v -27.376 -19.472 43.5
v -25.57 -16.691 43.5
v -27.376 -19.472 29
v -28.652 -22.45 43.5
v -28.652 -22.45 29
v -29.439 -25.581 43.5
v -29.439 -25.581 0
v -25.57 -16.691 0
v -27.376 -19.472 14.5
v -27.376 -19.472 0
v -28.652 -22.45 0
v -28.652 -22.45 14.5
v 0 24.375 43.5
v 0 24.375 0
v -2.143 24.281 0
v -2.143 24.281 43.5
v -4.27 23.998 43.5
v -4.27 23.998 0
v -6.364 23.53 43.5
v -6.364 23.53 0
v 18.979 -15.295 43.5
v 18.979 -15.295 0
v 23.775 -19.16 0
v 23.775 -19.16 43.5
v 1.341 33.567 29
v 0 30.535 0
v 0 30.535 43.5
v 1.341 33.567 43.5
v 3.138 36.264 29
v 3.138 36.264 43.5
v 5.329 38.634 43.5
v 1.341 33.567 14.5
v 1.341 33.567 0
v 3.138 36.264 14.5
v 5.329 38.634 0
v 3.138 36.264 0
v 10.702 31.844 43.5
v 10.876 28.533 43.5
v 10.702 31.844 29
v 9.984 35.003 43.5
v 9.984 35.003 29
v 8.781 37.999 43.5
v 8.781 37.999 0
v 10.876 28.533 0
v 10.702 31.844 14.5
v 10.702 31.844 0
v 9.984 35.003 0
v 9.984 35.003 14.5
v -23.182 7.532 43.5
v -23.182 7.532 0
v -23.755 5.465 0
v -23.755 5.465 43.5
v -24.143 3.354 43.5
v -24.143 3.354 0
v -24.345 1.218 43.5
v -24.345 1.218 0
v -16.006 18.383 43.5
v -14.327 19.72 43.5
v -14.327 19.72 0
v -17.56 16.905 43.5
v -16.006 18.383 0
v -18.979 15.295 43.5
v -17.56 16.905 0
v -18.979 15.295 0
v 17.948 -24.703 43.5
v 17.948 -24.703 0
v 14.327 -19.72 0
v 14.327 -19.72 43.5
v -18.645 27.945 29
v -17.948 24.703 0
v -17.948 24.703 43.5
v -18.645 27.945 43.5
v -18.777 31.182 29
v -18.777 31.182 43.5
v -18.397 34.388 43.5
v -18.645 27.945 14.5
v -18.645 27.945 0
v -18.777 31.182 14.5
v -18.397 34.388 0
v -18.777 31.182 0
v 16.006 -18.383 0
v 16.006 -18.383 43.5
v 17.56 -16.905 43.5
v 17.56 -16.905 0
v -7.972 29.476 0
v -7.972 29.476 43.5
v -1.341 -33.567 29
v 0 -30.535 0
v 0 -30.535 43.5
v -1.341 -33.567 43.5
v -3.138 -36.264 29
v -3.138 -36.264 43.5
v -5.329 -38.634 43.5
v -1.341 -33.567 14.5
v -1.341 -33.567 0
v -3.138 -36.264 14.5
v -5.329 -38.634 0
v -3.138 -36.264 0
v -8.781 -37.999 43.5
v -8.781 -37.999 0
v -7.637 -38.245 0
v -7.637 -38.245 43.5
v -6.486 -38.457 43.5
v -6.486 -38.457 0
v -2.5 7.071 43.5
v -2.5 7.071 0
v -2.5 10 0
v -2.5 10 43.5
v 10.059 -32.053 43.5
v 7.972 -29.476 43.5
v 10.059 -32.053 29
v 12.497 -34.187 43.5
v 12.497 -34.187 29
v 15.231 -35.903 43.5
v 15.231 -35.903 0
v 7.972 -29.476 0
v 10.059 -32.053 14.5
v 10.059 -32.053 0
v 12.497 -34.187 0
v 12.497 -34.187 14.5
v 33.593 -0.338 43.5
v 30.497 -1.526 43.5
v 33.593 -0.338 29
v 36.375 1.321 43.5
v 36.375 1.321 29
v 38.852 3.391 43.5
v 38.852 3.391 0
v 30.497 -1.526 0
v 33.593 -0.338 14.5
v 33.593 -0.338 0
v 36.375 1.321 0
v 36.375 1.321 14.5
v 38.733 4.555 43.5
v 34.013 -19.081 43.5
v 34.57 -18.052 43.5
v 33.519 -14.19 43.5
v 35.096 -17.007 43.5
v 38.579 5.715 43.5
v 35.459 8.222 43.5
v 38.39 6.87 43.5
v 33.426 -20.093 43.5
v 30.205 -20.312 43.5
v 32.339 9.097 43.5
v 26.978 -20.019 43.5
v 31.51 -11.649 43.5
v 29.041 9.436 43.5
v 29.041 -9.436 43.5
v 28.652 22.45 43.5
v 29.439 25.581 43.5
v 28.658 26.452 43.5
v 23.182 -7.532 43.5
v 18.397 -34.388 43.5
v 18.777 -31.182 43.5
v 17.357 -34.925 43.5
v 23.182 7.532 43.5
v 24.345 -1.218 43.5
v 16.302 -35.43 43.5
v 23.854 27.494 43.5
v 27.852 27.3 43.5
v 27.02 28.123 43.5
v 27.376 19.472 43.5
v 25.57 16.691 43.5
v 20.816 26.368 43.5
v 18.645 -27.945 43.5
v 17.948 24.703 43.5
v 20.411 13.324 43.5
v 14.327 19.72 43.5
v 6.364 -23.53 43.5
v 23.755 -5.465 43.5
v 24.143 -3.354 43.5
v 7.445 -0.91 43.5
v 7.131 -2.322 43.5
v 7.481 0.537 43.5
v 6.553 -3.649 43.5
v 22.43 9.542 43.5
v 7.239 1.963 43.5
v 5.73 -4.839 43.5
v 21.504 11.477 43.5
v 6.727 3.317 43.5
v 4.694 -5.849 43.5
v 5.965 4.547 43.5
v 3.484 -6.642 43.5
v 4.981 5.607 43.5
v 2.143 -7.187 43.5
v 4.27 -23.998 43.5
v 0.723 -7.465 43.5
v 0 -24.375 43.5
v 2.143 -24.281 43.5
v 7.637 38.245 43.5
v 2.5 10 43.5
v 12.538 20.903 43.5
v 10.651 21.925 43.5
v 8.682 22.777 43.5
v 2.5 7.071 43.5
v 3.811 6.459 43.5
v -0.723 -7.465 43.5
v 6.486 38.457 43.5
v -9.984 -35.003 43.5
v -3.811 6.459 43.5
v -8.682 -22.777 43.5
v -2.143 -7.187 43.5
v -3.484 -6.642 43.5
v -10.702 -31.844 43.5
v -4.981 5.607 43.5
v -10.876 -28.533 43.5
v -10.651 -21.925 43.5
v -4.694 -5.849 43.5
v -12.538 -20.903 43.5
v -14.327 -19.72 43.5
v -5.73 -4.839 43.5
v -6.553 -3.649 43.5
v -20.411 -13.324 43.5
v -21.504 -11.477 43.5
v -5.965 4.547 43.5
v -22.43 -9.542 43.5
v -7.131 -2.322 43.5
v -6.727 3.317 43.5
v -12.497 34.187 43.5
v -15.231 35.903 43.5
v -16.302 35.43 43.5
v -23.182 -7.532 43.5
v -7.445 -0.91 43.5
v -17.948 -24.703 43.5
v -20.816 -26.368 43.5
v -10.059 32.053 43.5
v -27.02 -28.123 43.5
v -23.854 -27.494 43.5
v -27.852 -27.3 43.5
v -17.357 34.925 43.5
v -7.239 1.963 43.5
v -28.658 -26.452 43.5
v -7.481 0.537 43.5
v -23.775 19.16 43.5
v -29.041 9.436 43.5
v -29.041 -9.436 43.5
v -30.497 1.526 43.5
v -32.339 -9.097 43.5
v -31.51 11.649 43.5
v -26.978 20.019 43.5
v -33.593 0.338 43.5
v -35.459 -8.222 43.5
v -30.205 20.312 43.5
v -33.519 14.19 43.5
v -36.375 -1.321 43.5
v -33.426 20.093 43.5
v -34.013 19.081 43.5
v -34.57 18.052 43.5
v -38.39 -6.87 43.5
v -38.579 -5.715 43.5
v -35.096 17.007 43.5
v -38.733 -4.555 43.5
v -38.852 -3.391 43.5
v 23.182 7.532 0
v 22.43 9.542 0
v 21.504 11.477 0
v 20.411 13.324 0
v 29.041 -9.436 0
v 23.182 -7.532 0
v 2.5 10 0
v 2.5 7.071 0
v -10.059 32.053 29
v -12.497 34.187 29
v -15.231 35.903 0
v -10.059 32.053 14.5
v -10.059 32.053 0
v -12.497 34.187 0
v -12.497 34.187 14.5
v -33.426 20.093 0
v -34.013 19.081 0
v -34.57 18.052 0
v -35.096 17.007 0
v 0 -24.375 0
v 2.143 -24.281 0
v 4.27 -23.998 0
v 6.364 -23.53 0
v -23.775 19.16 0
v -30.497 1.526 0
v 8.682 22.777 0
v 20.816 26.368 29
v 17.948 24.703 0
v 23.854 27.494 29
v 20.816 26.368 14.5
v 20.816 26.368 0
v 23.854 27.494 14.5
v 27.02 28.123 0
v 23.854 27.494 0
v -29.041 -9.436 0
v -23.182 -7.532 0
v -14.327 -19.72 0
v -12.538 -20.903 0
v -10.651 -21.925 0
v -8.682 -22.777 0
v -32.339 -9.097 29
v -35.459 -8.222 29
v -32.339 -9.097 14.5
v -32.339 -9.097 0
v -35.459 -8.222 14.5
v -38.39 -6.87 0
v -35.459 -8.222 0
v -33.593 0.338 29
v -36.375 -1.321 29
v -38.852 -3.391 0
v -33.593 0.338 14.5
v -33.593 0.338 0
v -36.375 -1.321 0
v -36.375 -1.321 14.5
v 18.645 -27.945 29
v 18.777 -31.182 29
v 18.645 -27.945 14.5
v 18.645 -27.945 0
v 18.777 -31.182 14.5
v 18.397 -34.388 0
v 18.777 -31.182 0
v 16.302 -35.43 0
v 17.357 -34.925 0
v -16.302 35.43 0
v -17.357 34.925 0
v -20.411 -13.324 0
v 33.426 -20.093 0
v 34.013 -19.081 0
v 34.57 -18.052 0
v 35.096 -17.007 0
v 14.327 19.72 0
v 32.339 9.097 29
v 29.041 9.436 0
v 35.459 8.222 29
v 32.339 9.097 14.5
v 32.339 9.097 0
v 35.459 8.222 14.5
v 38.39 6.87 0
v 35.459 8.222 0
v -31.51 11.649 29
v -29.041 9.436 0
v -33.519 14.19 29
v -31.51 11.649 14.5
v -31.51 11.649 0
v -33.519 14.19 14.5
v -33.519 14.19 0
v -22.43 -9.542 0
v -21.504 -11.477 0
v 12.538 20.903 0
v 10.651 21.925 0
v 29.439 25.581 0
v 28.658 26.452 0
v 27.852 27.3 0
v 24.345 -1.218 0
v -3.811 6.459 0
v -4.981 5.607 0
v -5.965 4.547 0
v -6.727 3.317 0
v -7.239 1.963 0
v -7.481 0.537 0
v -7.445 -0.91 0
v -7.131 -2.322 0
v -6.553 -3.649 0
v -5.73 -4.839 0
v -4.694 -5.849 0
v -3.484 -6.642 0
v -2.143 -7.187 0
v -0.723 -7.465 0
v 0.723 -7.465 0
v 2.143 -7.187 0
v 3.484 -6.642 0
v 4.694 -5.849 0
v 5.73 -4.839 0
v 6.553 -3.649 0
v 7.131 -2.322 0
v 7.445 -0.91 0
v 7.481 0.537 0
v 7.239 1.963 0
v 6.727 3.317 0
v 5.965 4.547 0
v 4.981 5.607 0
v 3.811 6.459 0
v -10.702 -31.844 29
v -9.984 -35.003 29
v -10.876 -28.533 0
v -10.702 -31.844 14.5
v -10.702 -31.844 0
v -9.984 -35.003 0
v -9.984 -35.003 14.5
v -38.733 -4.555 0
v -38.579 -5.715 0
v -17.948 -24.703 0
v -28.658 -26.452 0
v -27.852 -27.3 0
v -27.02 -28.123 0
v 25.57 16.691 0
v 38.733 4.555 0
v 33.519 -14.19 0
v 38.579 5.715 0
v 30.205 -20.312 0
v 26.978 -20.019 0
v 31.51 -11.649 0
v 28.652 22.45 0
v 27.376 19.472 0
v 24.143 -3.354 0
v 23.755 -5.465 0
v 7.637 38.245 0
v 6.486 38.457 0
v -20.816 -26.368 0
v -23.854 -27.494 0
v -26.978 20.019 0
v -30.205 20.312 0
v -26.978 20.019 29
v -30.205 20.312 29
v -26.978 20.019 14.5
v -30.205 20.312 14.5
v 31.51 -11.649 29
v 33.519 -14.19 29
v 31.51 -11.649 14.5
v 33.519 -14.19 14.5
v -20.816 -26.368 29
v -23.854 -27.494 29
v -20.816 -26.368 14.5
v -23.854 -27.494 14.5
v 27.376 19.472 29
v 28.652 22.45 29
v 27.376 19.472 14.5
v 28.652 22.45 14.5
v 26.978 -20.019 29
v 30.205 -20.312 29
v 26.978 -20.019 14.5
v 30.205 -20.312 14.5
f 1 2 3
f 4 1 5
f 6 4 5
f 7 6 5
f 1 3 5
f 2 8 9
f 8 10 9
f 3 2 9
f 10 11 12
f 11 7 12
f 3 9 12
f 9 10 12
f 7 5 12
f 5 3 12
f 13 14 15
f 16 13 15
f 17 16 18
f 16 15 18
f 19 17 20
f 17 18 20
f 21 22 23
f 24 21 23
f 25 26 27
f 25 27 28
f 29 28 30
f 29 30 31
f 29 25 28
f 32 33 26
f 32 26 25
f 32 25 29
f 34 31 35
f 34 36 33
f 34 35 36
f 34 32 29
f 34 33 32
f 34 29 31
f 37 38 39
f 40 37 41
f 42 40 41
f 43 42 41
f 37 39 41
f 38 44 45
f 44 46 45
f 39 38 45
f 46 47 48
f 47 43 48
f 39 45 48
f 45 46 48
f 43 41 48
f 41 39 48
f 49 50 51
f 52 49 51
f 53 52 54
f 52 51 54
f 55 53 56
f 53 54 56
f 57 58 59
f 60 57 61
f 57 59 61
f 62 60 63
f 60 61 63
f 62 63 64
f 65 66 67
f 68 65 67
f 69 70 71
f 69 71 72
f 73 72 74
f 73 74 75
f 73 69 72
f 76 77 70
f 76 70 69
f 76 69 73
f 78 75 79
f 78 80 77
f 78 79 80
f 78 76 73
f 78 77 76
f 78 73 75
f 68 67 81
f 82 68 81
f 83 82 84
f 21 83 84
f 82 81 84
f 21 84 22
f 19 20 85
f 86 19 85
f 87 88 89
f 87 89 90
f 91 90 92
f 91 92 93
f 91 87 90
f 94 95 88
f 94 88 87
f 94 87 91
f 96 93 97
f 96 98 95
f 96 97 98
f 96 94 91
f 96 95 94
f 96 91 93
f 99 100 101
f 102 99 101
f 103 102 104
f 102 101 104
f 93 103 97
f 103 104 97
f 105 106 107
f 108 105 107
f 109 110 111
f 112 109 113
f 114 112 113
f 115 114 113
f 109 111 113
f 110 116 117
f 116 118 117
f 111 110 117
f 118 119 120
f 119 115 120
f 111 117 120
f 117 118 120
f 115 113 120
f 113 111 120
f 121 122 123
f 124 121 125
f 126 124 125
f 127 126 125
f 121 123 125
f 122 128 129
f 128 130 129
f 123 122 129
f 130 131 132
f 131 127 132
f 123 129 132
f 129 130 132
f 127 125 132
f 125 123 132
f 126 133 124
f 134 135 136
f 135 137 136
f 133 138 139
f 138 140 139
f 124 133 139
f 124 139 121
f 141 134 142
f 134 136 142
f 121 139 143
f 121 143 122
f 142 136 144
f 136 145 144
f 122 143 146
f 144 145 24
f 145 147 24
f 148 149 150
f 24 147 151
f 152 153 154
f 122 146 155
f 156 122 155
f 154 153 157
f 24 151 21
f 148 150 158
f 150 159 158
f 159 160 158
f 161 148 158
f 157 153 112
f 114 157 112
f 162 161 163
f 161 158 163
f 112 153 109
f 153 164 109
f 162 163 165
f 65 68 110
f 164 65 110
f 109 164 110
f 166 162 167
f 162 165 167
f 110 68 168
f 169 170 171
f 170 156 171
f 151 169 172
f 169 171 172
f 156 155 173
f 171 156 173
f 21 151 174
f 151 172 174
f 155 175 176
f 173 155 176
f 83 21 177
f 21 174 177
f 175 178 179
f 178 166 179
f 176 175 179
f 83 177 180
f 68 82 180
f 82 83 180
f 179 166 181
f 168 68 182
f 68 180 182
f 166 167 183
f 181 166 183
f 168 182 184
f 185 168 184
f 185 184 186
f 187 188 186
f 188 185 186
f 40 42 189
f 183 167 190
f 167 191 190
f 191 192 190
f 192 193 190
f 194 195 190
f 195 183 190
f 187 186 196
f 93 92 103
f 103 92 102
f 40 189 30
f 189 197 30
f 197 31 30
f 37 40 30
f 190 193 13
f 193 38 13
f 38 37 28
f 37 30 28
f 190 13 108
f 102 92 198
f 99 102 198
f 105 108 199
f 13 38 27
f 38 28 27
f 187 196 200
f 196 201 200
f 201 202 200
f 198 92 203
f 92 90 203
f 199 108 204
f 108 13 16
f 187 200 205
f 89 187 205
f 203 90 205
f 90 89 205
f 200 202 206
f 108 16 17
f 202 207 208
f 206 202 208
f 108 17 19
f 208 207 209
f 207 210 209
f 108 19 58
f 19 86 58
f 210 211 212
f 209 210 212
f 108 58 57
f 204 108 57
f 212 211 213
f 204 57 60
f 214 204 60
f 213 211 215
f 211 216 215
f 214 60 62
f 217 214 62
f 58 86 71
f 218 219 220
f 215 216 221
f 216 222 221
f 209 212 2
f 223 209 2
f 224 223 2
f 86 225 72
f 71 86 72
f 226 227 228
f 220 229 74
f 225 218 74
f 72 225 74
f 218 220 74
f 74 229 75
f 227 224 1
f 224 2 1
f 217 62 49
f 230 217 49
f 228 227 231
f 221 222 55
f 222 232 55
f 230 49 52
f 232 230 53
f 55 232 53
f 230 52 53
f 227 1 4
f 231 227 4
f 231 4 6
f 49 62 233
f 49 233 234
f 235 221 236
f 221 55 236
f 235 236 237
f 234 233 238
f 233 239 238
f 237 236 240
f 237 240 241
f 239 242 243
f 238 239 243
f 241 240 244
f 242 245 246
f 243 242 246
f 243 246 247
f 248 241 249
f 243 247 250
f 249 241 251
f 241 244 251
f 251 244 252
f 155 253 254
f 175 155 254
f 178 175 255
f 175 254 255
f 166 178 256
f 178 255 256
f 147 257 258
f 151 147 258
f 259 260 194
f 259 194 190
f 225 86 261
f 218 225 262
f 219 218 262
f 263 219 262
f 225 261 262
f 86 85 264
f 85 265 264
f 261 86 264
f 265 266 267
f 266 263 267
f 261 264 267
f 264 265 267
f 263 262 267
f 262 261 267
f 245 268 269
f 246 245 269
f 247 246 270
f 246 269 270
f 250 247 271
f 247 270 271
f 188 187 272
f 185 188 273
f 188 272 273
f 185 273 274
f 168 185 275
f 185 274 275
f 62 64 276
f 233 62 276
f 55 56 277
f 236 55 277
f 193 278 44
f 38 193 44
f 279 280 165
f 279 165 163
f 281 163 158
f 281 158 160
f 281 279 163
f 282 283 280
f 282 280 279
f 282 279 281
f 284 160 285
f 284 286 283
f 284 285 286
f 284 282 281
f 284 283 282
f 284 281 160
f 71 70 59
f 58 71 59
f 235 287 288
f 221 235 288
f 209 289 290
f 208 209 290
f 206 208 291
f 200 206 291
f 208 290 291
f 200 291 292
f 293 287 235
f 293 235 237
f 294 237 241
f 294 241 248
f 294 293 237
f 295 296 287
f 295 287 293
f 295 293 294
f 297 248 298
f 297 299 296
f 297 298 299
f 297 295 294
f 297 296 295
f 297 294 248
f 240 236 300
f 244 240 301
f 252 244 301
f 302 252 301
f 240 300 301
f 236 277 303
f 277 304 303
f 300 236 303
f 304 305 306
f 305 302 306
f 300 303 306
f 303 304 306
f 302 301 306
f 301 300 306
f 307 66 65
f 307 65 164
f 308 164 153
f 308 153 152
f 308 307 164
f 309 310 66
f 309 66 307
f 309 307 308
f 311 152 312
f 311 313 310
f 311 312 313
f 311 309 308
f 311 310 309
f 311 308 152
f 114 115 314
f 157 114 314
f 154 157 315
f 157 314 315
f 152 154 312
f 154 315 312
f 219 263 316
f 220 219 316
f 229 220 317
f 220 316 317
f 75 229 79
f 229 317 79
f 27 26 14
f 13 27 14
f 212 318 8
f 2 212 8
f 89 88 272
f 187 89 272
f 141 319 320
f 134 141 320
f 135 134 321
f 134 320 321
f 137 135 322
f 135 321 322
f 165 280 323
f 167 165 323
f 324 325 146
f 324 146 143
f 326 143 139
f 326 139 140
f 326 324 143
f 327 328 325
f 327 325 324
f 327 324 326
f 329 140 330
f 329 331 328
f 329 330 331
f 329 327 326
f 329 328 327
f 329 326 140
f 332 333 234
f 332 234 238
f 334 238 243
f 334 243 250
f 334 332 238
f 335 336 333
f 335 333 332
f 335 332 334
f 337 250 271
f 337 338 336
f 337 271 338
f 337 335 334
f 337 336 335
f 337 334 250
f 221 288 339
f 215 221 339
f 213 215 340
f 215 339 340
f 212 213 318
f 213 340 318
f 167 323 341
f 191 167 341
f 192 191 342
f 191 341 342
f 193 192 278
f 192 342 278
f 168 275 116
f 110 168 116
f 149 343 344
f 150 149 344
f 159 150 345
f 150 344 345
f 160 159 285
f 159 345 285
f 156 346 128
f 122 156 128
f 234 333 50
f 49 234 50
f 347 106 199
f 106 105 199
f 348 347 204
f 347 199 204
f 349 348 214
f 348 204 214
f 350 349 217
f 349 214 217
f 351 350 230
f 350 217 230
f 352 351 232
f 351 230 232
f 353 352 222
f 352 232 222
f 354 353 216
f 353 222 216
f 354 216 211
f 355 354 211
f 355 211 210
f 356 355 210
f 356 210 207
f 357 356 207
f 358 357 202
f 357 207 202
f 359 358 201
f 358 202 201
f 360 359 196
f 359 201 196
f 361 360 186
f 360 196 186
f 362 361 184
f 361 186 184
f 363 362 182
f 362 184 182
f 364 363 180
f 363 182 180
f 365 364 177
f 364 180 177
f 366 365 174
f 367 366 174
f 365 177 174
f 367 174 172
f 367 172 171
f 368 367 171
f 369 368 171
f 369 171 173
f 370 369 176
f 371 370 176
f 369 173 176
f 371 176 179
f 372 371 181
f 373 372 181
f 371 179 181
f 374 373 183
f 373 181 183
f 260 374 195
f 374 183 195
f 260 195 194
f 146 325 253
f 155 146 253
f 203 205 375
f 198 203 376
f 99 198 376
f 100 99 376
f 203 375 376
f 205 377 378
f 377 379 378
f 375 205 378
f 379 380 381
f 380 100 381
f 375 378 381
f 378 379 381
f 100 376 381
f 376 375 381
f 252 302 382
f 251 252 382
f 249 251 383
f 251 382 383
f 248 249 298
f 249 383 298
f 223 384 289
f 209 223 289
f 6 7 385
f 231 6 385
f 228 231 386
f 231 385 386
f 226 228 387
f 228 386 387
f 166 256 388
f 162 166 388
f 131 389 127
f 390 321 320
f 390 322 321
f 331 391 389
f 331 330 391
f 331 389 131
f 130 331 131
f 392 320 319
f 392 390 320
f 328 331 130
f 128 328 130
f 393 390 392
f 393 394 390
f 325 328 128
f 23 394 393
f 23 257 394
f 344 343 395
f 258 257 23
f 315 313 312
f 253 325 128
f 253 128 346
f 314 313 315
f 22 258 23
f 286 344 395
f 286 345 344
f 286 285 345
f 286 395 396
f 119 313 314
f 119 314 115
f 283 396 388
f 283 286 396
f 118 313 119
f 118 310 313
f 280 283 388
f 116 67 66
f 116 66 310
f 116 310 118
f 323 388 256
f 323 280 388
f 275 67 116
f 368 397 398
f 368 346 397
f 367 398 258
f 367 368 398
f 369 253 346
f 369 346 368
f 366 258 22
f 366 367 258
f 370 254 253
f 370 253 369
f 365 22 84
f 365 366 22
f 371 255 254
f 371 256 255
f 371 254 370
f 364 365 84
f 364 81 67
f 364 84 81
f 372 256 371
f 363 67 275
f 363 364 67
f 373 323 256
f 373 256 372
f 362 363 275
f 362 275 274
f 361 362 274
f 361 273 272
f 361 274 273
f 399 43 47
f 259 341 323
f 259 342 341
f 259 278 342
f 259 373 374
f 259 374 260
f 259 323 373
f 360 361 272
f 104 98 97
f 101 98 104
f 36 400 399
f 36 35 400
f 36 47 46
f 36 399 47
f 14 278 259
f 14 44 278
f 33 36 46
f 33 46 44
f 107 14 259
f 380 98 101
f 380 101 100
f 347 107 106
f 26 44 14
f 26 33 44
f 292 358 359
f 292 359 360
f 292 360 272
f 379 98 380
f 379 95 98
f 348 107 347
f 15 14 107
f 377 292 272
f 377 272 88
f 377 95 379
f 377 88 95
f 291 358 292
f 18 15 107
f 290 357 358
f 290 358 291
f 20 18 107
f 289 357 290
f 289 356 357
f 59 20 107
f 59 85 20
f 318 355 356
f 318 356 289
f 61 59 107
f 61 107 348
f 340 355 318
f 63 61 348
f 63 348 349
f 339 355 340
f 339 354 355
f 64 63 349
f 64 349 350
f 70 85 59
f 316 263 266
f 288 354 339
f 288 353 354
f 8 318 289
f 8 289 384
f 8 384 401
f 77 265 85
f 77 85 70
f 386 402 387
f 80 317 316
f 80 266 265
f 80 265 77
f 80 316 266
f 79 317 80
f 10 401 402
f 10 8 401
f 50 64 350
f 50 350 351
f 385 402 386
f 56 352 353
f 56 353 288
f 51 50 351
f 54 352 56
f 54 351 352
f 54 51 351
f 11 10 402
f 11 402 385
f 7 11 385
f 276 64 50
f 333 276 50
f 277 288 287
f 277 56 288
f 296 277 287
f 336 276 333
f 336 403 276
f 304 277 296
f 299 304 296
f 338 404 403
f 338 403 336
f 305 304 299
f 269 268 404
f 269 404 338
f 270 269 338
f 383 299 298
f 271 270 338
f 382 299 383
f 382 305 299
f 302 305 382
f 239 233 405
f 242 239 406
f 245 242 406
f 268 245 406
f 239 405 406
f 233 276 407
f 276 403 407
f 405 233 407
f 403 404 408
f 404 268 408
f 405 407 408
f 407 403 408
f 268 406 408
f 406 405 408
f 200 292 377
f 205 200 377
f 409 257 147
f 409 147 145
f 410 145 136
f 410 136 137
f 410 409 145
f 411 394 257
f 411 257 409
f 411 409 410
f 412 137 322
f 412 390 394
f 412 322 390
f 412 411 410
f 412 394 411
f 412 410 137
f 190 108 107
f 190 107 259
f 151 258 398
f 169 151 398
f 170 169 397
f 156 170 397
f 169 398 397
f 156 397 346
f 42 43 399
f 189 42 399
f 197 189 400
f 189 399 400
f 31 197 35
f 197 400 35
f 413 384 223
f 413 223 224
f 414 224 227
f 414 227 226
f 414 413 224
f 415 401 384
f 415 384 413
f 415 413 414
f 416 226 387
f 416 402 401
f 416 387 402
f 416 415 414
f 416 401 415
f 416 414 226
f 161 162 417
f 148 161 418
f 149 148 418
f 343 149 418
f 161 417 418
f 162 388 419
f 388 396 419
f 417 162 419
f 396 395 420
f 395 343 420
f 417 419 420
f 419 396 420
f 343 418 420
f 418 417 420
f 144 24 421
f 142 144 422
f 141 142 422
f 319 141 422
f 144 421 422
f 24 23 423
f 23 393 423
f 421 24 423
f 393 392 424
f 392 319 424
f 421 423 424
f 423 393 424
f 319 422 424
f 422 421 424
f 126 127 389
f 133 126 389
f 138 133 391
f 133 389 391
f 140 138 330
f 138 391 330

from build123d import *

# Parameters (mm, degrees)
BOSS_EXTRUDE1_DEPTH = 43.5
CIRPATTERN1_COUNT   = 10
SKETCH2_R           = 7.5
CUT_EXTRUDE1_DEPTH  = 70.959609915
SKETCH3_W           = 5
SKETCH3_H           = 5
CUT_EXTRUDE2_DEPTH  = 70.959609915


with BuildPart() as part:
    # Sketch1 → Boss-Extrude1 (new body)
    with BuildSketch(Plane.XY):
        with BuildLine():
            add(Edge.make_bspline(
                [(0, 30.535), (1.094025697, 33.738879921), (2.960368297, 36.423385517), (5.329249796, 38.634170065)],
                knots=[0, 0, 0, 0, 0.089409401, 0.089409401, 0.089409401, 0.089409401], degree=3))
            Line((0, 30.535), (0, 24.375))
            ThreePointArc((0, 24.375), (-4.413773565, -23.972050974), (8.681616812, 22.776526393))
            Line((8.681616812, 22.776526393), (10.875617204, 28.532563422))
            add(Edge.make_bspline(
                [(10.875617204, 28.532563422), (10.994458338, 31.915995933), (10.206644899, 35.089189117), (8.780523558, 37.998715847)],
                knots=[0, 0, 0, 0, 0.089409401, 0.089409401, 0.089409401, 0.089409401], degree=3))
            ThreePointArc((8.780523558, 37.998715847), (7.062037704, 38.355281559), (5.329249796, 38.634170065))
        make_face()
    boss_extrude1 = extrude(amount=BOSS_EXTRUDE1_DEPTH)

    # CirPattern1: Boss-Extrude1 ×10 about axis
    cirpattern1_axis = Axis((0, 0, 0), (0, 0, -1))
    for i in range(1, CIRPATTERN1_COUNT):
        add(boss_extrude1.rotate(cirpattern1_axis, i * 360 / CIRPATTERN1_COUNT))

    # Sketch2 → Cut-Extrude1 (cut, through all)
    with BuildSketch(Plane.XY.offset(43.5)):
        Circle(SKETCH2_R)
    extrude(amount=-CUT_EXTRUDE1_DEPTH, mode=Mode.SUBTRACT)

    # Sketch3 → Cut-Extrude2 (cut, through all)
    with BuildSketch(Plane.XY.offset(43.5)):
        with Locations((0, 7.5)):
            Rectangle(SKETCH3_W, SKETCH3_H)
    extrude(amount=-CUT_EXTRUDE2_DEPTH, mode=Mode.SUBTRACT)


solid = part.part
